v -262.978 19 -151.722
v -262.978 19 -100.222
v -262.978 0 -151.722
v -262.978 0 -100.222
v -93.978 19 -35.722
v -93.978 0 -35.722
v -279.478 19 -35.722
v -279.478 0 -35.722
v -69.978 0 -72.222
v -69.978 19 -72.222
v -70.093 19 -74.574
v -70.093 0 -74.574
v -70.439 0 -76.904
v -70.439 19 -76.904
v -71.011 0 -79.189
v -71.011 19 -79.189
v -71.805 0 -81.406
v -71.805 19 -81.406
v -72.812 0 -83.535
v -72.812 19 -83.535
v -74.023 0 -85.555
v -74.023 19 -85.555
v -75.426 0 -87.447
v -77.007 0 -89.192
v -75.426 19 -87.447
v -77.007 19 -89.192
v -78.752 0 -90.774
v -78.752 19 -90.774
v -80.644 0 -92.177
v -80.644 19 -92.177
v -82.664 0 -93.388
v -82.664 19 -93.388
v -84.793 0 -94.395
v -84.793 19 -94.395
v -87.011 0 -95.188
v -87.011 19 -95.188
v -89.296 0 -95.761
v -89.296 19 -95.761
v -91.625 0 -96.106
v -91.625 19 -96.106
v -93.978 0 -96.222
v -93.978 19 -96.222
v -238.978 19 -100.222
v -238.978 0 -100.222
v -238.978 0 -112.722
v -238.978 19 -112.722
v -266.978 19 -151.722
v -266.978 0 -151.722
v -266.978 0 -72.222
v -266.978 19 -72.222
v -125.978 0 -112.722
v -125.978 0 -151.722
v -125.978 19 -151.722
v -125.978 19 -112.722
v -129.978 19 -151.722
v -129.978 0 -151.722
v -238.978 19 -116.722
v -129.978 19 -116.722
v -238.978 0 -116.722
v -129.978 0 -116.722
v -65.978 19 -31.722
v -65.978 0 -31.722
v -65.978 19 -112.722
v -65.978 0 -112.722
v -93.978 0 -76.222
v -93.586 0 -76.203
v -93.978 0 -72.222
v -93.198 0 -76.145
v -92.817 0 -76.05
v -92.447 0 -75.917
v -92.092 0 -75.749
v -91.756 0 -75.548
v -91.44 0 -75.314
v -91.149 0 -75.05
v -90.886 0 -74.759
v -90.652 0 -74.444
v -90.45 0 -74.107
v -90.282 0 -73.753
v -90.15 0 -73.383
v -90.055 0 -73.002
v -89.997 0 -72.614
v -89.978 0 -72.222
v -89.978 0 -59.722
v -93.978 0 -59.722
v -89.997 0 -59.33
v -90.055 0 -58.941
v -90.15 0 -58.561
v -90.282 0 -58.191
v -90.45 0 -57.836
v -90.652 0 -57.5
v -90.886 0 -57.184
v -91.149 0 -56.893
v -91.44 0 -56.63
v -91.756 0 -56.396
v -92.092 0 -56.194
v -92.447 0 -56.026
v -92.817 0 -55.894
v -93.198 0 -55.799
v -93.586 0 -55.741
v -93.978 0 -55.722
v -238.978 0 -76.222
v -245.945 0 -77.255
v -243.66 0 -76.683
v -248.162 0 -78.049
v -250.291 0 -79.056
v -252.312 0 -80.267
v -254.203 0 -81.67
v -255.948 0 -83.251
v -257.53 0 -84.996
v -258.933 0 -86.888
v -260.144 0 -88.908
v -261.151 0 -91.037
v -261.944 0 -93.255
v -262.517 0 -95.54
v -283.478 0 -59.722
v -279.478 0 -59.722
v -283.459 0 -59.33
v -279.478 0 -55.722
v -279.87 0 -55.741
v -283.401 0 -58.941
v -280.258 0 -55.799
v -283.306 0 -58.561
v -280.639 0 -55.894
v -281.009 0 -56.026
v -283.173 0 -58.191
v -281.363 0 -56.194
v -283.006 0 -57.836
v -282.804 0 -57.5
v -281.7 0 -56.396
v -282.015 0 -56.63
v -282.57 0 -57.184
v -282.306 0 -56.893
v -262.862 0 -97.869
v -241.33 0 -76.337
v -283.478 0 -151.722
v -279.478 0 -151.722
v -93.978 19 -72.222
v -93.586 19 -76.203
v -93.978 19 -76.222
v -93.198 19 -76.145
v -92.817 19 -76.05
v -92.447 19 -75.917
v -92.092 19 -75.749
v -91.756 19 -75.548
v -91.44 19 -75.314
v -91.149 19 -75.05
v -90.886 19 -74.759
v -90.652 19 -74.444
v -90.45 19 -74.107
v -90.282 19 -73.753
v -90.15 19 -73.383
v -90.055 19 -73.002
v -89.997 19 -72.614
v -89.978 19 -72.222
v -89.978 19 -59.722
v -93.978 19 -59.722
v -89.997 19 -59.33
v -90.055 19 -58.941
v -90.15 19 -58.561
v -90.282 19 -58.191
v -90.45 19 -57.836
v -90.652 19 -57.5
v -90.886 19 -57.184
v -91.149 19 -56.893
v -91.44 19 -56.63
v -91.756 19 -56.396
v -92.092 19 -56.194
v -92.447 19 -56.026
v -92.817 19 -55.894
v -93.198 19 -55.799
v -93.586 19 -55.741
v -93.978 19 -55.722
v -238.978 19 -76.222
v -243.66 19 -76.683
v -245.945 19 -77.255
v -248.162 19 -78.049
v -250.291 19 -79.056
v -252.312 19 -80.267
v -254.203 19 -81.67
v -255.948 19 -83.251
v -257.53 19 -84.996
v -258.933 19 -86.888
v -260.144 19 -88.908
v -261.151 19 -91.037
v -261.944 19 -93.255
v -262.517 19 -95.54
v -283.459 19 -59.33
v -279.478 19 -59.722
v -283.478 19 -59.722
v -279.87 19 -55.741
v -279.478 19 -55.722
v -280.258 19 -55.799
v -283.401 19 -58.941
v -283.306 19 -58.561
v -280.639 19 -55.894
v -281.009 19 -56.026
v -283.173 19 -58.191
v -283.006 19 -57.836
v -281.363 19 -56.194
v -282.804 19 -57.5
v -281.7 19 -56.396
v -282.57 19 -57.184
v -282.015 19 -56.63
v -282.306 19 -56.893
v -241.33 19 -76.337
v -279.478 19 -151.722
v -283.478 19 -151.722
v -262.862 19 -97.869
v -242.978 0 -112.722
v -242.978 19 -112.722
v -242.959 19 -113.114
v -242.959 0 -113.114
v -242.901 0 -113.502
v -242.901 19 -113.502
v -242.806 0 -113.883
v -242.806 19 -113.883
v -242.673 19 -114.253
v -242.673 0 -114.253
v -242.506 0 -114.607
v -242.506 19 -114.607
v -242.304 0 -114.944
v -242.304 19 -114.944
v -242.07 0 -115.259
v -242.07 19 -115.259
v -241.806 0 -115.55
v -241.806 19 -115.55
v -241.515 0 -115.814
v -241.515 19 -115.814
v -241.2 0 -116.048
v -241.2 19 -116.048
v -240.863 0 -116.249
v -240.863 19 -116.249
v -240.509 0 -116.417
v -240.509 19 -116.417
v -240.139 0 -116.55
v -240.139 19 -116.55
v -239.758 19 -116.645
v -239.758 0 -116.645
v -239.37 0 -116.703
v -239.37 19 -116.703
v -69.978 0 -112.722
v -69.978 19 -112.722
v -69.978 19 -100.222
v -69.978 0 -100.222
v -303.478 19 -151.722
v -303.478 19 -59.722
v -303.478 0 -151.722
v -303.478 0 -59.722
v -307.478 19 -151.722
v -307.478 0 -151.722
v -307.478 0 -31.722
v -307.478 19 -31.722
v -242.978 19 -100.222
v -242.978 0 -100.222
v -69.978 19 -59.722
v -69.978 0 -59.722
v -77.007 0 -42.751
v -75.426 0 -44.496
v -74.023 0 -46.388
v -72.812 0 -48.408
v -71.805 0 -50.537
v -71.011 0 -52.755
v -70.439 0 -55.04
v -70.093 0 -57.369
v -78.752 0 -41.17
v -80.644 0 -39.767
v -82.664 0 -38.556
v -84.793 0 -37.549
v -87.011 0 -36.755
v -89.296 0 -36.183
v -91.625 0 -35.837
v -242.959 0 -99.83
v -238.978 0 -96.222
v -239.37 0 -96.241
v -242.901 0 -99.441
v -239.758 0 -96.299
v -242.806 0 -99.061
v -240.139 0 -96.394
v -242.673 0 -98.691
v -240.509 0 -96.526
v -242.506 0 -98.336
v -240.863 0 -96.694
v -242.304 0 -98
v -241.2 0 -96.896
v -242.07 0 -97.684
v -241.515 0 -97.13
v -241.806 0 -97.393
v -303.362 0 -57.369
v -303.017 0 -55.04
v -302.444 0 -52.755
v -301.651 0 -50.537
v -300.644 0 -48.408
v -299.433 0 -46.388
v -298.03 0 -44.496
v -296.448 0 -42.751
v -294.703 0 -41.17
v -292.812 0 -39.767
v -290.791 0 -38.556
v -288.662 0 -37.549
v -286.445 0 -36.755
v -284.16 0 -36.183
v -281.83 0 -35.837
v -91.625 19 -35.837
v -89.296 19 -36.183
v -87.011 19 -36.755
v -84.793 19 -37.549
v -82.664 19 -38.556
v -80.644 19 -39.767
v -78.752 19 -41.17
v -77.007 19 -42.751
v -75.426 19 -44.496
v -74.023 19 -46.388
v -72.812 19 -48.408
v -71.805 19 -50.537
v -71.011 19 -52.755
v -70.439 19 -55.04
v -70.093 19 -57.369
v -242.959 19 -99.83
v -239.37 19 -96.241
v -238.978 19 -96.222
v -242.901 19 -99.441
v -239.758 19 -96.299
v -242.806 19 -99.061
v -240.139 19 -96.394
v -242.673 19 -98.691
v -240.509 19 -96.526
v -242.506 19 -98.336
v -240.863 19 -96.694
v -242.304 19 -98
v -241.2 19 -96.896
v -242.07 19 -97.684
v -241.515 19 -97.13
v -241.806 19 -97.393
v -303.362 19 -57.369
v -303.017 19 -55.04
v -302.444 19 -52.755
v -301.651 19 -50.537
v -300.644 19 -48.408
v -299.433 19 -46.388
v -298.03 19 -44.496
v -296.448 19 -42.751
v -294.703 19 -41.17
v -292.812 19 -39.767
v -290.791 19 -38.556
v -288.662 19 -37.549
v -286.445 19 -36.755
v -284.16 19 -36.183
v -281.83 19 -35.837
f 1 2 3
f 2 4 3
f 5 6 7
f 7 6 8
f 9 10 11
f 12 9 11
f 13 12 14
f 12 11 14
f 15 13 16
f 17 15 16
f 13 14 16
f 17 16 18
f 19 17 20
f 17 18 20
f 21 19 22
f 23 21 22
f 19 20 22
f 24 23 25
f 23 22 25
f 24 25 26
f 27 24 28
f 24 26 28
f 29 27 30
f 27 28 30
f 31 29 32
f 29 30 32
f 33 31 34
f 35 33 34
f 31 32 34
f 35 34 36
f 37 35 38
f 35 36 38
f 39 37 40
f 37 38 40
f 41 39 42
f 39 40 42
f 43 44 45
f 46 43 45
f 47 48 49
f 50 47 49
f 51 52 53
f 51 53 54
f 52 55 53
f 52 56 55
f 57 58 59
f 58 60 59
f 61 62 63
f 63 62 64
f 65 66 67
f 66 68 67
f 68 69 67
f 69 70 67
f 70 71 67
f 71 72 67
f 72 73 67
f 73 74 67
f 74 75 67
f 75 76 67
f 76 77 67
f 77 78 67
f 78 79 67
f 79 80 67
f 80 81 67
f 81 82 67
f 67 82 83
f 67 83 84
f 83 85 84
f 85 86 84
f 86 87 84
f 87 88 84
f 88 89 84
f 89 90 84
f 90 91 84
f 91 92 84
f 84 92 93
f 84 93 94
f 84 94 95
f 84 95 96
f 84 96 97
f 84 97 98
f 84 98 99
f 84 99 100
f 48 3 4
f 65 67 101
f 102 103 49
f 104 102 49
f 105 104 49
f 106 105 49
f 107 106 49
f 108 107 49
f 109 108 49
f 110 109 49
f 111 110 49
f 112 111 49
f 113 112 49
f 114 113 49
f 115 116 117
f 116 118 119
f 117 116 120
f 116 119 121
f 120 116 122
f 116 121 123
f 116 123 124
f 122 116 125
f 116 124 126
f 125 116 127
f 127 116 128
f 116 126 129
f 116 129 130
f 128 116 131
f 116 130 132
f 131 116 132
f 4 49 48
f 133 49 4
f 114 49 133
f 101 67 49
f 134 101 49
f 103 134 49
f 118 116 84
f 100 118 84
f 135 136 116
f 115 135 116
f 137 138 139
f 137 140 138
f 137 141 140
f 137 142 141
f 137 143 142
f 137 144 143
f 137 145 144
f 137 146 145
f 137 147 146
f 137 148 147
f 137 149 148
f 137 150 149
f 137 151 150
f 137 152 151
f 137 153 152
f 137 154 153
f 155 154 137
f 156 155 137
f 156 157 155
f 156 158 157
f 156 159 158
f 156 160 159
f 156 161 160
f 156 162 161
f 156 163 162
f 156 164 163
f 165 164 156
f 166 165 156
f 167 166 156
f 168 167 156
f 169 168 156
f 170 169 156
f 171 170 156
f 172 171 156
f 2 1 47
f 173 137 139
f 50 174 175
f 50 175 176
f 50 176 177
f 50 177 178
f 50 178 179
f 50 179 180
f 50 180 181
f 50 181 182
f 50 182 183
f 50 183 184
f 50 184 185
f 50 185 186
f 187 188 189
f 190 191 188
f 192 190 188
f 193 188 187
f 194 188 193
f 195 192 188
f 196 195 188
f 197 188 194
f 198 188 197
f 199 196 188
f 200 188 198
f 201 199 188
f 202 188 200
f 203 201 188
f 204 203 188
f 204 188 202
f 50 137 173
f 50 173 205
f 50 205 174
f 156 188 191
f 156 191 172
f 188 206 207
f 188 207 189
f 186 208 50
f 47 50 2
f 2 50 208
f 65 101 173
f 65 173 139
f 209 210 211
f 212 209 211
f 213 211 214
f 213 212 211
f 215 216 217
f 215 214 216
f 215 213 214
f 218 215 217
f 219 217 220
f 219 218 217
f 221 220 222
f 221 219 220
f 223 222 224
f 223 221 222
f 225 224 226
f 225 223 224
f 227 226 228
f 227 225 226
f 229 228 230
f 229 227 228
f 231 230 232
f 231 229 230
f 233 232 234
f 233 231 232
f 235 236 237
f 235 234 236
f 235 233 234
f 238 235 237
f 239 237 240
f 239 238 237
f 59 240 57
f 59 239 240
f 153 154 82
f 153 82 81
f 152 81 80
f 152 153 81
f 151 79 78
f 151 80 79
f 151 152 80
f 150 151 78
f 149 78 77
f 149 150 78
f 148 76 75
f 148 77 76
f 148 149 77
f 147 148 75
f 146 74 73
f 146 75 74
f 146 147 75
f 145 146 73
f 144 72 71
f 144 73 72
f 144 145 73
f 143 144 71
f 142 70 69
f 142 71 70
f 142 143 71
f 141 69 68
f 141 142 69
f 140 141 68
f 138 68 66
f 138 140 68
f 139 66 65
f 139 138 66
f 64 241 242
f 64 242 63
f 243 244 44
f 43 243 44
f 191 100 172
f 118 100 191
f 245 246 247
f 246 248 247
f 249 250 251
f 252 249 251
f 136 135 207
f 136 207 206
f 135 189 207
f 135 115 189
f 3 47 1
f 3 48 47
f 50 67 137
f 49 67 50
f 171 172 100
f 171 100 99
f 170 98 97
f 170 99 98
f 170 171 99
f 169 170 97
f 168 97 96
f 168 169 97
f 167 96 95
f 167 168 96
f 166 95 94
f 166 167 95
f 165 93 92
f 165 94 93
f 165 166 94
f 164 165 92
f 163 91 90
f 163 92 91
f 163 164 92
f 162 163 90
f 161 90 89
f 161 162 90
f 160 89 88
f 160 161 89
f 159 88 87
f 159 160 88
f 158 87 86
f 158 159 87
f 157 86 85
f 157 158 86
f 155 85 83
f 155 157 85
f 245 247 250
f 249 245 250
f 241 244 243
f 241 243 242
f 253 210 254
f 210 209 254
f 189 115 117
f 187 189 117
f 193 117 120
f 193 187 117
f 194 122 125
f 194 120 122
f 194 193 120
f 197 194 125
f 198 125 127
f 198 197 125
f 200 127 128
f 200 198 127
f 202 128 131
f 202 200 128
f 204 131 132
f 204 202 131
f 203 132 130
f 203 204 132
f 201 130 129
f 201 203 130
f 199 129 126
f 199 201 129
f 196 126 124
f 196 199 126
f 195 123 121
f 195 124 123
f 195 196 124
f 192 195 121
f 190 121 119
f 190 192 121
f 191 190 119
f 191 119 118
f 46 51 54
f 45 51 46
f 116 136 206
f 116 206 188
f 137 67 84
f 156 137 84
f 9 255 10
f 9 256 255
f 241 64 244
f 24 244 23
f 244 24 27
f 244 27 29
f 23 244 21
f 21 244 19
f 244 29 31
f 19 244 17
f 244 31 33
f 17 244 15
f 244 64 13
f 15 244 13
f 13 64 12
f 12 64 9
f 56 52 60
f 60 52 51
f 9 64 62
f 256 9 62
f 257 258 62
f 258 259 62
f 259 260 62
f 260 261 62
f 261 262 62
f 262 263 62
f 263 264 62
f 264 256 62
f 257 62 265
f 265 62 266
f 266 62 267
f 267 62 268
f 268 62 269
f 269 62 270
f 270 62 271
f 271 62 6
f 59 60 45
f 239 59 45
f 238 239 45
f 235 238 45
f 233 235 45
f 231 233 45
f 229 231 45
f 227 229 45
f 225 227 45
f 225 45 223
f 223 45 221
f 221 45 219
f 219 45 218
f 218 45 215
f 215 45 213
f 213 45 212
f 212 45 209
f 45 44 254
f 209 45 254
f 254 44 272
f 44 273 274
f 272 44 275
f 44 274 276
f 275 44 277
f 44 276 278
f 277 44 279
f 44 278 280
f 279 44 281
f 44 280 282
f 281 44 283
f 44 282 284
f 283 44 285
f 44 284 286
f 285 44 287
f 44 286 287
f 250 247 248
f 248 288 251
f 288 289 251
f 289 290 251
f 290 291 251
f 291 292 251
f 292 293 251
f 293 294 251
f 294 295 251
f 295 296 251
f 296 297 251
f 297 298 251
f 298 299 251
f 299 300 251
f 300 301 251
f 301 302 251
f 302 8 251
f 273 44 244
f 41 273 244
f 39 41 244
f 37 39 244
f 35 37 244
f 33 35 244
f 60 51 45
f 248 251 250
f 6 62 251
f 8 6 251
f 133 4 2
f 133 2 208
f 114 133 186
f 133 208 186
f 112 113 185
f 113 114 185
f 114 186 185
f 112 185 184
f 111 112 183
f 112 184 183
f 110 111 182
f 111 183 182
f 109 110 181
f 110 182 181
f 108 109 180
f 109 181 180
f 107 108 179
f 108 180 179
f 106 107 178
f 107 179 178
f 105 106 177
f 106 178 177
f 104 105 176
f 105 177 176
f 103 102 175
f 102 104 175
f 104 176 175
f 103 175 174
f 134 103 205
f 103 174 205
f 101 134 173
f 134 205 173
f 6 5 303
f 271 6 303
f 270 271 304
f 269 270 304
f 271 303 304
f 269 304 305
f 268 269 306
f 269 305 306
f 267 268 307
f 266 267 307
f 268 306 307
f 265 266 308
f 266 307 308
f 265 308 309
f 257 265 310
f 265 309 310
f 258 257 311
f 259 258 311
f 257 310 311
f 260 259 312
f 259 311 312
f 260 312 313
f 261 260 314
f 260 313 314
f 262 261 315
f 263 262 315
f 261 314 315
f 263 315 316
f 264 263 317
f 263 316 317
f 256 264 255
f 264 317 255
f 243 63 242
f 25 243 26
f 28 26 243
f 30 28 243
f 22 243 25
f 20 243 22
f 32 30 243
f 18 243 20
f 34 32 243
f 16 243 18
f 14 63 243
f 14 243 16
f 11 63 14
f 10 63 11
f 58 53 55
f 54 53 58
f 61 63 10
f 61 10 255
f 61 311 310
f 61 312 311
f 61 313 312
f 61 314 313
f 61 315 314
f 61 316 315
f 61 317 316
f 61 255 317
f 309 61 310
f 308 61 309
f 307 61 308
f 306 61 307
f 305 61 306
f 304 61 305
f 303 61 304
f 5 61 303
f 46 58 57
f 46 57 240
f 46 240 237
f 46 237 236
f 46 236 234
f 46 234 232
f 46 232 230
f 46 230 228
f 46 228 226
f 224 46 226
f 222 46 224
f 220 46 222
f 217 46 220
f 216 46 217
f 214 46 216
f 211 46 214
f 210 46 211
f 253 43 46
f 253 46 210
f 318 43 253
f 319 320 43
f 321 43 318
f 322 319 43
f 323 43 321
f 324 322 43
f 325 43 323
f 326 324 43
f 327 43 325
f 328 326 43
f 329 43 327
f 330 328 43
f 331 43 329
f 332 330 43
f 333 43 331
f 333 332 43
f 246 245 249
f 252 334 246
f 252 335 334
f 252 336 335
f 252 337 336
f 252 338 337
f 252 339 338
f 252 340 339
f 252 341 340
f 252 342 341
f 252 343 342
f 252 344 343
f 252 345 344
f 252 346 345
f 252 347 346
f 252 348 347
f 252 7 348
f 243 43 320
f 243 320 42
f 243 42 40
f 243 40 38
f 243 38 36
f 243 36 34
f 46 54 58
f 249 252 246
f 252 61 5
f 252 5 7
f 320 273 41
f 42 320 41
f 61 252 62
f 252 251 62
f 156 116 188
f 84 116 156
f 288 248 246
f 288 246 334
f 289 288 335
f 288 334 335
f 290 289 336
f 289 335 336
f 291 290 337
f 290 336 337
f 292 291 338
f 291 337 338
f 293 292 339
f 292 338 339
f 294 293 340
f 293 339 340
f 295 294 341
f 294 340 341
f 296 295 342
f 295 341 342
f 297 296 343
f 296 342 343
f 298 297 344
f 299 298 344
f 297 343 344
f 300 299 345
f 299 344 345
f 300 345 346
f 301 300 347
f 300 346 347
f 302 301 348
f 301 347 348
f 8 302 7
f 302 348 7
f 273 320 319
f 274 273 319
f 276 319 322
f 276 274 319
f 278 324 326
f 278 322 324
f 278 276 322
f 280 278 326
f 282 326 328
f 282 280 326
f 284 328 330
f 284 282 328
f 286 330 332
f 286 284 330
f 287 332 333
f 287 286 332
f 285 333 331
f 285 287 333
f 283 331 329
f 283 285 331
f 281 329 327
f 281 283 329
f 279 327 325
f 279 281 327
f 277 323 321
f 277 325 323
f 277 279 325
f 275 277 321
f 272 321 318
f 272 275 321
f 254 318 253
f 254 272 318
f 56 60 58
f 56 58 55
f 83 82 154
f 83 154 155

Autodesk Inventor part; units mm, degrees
ref_plane "YZ Plane" through (0, 0, 0) normal (1, 0, 0) x (0, 1, 0)
ref_plane "XZ Plane" through (0, 0, 0) normal (0, 1, 0) x (-1, 0, 0)
ref_plane "XY Plane" through (0, 0, 0) normal (0, 0, 1) x (1, 0, 0)
sketch "Sketch1" plane through (0, 0, 0) normal (0, 1, 0) x (-1, 0, 0)
  line L0 (81.3062, -31.7218) -> (303.4779, -31.7218) construction
  line L1 (303.4779, -31.7218) -> (303.4779, -151.7218)
  line L2 (303.4779, -151.7218) -> (81.3062, -151.7218)
  line L3 (65.9779, -116.7218) -> (242.9779, -116.7218)
  line L4 (69.9779, -112.7218) -> (238.9779, -112.7218)
  line L5 (242.9779, -116.7218) -> (242.9779, -96.2218)
  line L6 (242.9779, -96.2218) -> (65.9779, -96.2218)
  line L7 (65.9779, -100.2218) -> (238.9779, -100.2218)
  line L8 (238.9779, -100.2218) -> (238.9779, -112.7218)
  arc A0 (242.9779, -100.2218) -> (238.9779, -96.2218) centre (238.9779, -100.2218) ccw
  arc A1 (238.9779, -116.7218) -> (242.9779, -112.7218) centre (238.9779, -112.7218) ccw
  line L9 (262.9779, -76.2218) -> (89.9779, -76.2218)
  line L10 (89.9779, -76.2218) -> (89.9779, -72.2218)
  line L11 (89.9779, -72.2218) -> (262.9779, -72.2218)
  line L12 (262.9779, -59.7218) -> (262.9779, -151.7218)
  line L13 (262.9779, -72.2218) -> (262.9779, -151.7218)
  line L14 (262.9779, -151.7218) -> (266.9779, -151.7218)
  line L15 (266.9779, -151.7218) -> (266.9779, -59.7218)
  line L16 (266.9779, -72.2218) -> (262.9779, -72.2218)
  line L17 (65.9779, -31.7218) -> (65.9779, -35.7218)
  line L18 (65.9779, -35.7218) -> (303.4779, -35.7218)
  line L19 (303.4779, -35.7218) -> (303.4779, -31.7218)
  line L20 (303.4779, -31.7218) -> (65.9779, -31.7218)
  line L21 (89.9779, -55.7218) -> (266.9779, -55.7218)
  line L22 (266.9779, -55.7218) -> (266.9779, -59.7218)
  line L23 (279.4779, -59.7218) -> (89.9779, -59.7218)
  line L24 (89.9779, -59.7218) -> (89.9779, -55.7218)
  line L25 (89.9779, -55.7218) -> (89.9779, -76.2218)
  line L26 (81.3062, -151.7218) -> (129.9779, -151.7218)
  line L27 (69.9779, -31.7218) -> (65.9779, -31.7218)
  line L28 (303.4779, -31.7218) -> (303.4779, -151.7218)
  line L29 (303.4779, -151.7218) -> (307.4779, -151.7218)
  line L30 (307.4779, -151.7218) -> (307.4779, -31.7218)
  line L31 (307.4779, -31.7218) -> (303.4779, -31.7218)
  line L32 (89.9779, -55.7218) -> (89.9779, -76.2218)
  line L33 (89.9779, -76.2218) -> (93.9779, -76.2218)
  line L34 (93.9779, -76.2218) -> (93.9779, -55.7218)
  line L35 (93.9779, -55.7218) -> (89.9779, -55.7218)
  line L36 (279.4779, -151.7218) -> (279.4779, -55.7218)
  line L37 (279.4779, -55.7218) -> (283.4779, -55.7218)
  line L38 (283.4779, -55.7218) -> (283.4779, -151.7218)
  line L39 (283.4779, -151.7218) -> (279.4779, -151.7218)
  line L40 (266.9779, -55.7218) -> (279.4779, -55.7218)
  line L41 (65.9779, -35.7218) -> (65.9779, -116.7218)
  line L42 (69.9779, -31.7218) -> (69.9779, -112.7218)
  line L43 (65.9779, -116.7218) -> (129.9779, -116.7218)
  line L44 (129.9779, -116.7218) -> (129.9779, -112.7218)
  line L45 (129.9779, -112.7218) -> (65.9779, -112.7218)
  line L46 (65.9779, -112.7218) -> (65.9779, -116.7218)
  line L47 (129.9779, -112.7218) -> (129.9779, -151.7218)
  line L48 (129.9779, -151.7218) -> (125.9779, -151.7218)
  line L49 (125.9779, -151.7218) -> (125.9779, -112.7218)
  line L50 (125.9779, -112.7218) -> (129.9779, -112.7218)
  point P0 (81.3062, -112.7218)
  point P1 (266.9779, -151.7218)
  point P2 (93.9779, -72.2218)
  point P3 (93.9779, -59.7218)
  point P4 (89.9779, -59.7218)
  point P5 (89.9779, -72.2218)
  point P6 (89.9779, -59.7218)
  point P7 (89.9779, -72.2218)
  point P8 (69.9779, -100.2218)
  point P9 (65.9779, -112.7218)
  point P10 (69.9779, -96.2218)
  point P11 (69.9779, -35.7218)
  dimension "d10" = 120
  dimension "d13" = 35
  dimension "d14" = 4
  dimension "d15" = 4
  dimension "d16" = 4
  dimension "d17" = 12.5
  dimension "d20" = 20
  dimension "d21" = 4
  dimension "d23" = 4
  dimension "d25" = 4
  dimension "d26" = 20
  dimension "d31" = 4
  dimension "d32" = 4
  dimension "d34" = 12.5
  dimension "d35" = 4
  dimension "d36" = 20
  dimension "d43" = 4
  dimension "d44" = 4
  dimension "d46" = 20
  dimension "d47" = 4
  dimension "d48" = 20
  dimension "d49" = 4
  dimension "d50" = 133
  dimension "d51" = 173
extrude "Extrusion1" add sketch "Sketch1" along normal blind 19 contours L31 L30 L29 L1 | L1 L18 L42 L20 | L42 L18 L17 L20 | L42 L6 L41 L18 | L2 L36 L37 L38 | L42 L7 L41 L6 | L6 A0 L5 A1 L3 L44 L4 L8 L7 L42 | L42 L45 L41 L7 | L2 L12 L16 L15 | L23 L22 L40 L36 | L23 L34 L21 L22 | L4 L44 L3 L49 | L2 L49 L3 L47 | L9 L34 L11 L12 | L34 L23 L24 L21 | L9 L10 L11 L34 | L11 L25 L23 L34
fillet "Fillet1" radius 24 4 edges at (-303.4779, 9.5, -35.7218) (-262.9779, 9.5, -76.2218) (-69.9779, 9.5, -96.2218) (-69.9779, 9.5, -35.7218)
fillet "Fillet2" radius 4 3 edges at (-283.4779, 9.5, -55.7218) (-89.9779, 9.5, -55.7218) (-89.9779, 9.5, -76.2218)
properties part number "midPath"
